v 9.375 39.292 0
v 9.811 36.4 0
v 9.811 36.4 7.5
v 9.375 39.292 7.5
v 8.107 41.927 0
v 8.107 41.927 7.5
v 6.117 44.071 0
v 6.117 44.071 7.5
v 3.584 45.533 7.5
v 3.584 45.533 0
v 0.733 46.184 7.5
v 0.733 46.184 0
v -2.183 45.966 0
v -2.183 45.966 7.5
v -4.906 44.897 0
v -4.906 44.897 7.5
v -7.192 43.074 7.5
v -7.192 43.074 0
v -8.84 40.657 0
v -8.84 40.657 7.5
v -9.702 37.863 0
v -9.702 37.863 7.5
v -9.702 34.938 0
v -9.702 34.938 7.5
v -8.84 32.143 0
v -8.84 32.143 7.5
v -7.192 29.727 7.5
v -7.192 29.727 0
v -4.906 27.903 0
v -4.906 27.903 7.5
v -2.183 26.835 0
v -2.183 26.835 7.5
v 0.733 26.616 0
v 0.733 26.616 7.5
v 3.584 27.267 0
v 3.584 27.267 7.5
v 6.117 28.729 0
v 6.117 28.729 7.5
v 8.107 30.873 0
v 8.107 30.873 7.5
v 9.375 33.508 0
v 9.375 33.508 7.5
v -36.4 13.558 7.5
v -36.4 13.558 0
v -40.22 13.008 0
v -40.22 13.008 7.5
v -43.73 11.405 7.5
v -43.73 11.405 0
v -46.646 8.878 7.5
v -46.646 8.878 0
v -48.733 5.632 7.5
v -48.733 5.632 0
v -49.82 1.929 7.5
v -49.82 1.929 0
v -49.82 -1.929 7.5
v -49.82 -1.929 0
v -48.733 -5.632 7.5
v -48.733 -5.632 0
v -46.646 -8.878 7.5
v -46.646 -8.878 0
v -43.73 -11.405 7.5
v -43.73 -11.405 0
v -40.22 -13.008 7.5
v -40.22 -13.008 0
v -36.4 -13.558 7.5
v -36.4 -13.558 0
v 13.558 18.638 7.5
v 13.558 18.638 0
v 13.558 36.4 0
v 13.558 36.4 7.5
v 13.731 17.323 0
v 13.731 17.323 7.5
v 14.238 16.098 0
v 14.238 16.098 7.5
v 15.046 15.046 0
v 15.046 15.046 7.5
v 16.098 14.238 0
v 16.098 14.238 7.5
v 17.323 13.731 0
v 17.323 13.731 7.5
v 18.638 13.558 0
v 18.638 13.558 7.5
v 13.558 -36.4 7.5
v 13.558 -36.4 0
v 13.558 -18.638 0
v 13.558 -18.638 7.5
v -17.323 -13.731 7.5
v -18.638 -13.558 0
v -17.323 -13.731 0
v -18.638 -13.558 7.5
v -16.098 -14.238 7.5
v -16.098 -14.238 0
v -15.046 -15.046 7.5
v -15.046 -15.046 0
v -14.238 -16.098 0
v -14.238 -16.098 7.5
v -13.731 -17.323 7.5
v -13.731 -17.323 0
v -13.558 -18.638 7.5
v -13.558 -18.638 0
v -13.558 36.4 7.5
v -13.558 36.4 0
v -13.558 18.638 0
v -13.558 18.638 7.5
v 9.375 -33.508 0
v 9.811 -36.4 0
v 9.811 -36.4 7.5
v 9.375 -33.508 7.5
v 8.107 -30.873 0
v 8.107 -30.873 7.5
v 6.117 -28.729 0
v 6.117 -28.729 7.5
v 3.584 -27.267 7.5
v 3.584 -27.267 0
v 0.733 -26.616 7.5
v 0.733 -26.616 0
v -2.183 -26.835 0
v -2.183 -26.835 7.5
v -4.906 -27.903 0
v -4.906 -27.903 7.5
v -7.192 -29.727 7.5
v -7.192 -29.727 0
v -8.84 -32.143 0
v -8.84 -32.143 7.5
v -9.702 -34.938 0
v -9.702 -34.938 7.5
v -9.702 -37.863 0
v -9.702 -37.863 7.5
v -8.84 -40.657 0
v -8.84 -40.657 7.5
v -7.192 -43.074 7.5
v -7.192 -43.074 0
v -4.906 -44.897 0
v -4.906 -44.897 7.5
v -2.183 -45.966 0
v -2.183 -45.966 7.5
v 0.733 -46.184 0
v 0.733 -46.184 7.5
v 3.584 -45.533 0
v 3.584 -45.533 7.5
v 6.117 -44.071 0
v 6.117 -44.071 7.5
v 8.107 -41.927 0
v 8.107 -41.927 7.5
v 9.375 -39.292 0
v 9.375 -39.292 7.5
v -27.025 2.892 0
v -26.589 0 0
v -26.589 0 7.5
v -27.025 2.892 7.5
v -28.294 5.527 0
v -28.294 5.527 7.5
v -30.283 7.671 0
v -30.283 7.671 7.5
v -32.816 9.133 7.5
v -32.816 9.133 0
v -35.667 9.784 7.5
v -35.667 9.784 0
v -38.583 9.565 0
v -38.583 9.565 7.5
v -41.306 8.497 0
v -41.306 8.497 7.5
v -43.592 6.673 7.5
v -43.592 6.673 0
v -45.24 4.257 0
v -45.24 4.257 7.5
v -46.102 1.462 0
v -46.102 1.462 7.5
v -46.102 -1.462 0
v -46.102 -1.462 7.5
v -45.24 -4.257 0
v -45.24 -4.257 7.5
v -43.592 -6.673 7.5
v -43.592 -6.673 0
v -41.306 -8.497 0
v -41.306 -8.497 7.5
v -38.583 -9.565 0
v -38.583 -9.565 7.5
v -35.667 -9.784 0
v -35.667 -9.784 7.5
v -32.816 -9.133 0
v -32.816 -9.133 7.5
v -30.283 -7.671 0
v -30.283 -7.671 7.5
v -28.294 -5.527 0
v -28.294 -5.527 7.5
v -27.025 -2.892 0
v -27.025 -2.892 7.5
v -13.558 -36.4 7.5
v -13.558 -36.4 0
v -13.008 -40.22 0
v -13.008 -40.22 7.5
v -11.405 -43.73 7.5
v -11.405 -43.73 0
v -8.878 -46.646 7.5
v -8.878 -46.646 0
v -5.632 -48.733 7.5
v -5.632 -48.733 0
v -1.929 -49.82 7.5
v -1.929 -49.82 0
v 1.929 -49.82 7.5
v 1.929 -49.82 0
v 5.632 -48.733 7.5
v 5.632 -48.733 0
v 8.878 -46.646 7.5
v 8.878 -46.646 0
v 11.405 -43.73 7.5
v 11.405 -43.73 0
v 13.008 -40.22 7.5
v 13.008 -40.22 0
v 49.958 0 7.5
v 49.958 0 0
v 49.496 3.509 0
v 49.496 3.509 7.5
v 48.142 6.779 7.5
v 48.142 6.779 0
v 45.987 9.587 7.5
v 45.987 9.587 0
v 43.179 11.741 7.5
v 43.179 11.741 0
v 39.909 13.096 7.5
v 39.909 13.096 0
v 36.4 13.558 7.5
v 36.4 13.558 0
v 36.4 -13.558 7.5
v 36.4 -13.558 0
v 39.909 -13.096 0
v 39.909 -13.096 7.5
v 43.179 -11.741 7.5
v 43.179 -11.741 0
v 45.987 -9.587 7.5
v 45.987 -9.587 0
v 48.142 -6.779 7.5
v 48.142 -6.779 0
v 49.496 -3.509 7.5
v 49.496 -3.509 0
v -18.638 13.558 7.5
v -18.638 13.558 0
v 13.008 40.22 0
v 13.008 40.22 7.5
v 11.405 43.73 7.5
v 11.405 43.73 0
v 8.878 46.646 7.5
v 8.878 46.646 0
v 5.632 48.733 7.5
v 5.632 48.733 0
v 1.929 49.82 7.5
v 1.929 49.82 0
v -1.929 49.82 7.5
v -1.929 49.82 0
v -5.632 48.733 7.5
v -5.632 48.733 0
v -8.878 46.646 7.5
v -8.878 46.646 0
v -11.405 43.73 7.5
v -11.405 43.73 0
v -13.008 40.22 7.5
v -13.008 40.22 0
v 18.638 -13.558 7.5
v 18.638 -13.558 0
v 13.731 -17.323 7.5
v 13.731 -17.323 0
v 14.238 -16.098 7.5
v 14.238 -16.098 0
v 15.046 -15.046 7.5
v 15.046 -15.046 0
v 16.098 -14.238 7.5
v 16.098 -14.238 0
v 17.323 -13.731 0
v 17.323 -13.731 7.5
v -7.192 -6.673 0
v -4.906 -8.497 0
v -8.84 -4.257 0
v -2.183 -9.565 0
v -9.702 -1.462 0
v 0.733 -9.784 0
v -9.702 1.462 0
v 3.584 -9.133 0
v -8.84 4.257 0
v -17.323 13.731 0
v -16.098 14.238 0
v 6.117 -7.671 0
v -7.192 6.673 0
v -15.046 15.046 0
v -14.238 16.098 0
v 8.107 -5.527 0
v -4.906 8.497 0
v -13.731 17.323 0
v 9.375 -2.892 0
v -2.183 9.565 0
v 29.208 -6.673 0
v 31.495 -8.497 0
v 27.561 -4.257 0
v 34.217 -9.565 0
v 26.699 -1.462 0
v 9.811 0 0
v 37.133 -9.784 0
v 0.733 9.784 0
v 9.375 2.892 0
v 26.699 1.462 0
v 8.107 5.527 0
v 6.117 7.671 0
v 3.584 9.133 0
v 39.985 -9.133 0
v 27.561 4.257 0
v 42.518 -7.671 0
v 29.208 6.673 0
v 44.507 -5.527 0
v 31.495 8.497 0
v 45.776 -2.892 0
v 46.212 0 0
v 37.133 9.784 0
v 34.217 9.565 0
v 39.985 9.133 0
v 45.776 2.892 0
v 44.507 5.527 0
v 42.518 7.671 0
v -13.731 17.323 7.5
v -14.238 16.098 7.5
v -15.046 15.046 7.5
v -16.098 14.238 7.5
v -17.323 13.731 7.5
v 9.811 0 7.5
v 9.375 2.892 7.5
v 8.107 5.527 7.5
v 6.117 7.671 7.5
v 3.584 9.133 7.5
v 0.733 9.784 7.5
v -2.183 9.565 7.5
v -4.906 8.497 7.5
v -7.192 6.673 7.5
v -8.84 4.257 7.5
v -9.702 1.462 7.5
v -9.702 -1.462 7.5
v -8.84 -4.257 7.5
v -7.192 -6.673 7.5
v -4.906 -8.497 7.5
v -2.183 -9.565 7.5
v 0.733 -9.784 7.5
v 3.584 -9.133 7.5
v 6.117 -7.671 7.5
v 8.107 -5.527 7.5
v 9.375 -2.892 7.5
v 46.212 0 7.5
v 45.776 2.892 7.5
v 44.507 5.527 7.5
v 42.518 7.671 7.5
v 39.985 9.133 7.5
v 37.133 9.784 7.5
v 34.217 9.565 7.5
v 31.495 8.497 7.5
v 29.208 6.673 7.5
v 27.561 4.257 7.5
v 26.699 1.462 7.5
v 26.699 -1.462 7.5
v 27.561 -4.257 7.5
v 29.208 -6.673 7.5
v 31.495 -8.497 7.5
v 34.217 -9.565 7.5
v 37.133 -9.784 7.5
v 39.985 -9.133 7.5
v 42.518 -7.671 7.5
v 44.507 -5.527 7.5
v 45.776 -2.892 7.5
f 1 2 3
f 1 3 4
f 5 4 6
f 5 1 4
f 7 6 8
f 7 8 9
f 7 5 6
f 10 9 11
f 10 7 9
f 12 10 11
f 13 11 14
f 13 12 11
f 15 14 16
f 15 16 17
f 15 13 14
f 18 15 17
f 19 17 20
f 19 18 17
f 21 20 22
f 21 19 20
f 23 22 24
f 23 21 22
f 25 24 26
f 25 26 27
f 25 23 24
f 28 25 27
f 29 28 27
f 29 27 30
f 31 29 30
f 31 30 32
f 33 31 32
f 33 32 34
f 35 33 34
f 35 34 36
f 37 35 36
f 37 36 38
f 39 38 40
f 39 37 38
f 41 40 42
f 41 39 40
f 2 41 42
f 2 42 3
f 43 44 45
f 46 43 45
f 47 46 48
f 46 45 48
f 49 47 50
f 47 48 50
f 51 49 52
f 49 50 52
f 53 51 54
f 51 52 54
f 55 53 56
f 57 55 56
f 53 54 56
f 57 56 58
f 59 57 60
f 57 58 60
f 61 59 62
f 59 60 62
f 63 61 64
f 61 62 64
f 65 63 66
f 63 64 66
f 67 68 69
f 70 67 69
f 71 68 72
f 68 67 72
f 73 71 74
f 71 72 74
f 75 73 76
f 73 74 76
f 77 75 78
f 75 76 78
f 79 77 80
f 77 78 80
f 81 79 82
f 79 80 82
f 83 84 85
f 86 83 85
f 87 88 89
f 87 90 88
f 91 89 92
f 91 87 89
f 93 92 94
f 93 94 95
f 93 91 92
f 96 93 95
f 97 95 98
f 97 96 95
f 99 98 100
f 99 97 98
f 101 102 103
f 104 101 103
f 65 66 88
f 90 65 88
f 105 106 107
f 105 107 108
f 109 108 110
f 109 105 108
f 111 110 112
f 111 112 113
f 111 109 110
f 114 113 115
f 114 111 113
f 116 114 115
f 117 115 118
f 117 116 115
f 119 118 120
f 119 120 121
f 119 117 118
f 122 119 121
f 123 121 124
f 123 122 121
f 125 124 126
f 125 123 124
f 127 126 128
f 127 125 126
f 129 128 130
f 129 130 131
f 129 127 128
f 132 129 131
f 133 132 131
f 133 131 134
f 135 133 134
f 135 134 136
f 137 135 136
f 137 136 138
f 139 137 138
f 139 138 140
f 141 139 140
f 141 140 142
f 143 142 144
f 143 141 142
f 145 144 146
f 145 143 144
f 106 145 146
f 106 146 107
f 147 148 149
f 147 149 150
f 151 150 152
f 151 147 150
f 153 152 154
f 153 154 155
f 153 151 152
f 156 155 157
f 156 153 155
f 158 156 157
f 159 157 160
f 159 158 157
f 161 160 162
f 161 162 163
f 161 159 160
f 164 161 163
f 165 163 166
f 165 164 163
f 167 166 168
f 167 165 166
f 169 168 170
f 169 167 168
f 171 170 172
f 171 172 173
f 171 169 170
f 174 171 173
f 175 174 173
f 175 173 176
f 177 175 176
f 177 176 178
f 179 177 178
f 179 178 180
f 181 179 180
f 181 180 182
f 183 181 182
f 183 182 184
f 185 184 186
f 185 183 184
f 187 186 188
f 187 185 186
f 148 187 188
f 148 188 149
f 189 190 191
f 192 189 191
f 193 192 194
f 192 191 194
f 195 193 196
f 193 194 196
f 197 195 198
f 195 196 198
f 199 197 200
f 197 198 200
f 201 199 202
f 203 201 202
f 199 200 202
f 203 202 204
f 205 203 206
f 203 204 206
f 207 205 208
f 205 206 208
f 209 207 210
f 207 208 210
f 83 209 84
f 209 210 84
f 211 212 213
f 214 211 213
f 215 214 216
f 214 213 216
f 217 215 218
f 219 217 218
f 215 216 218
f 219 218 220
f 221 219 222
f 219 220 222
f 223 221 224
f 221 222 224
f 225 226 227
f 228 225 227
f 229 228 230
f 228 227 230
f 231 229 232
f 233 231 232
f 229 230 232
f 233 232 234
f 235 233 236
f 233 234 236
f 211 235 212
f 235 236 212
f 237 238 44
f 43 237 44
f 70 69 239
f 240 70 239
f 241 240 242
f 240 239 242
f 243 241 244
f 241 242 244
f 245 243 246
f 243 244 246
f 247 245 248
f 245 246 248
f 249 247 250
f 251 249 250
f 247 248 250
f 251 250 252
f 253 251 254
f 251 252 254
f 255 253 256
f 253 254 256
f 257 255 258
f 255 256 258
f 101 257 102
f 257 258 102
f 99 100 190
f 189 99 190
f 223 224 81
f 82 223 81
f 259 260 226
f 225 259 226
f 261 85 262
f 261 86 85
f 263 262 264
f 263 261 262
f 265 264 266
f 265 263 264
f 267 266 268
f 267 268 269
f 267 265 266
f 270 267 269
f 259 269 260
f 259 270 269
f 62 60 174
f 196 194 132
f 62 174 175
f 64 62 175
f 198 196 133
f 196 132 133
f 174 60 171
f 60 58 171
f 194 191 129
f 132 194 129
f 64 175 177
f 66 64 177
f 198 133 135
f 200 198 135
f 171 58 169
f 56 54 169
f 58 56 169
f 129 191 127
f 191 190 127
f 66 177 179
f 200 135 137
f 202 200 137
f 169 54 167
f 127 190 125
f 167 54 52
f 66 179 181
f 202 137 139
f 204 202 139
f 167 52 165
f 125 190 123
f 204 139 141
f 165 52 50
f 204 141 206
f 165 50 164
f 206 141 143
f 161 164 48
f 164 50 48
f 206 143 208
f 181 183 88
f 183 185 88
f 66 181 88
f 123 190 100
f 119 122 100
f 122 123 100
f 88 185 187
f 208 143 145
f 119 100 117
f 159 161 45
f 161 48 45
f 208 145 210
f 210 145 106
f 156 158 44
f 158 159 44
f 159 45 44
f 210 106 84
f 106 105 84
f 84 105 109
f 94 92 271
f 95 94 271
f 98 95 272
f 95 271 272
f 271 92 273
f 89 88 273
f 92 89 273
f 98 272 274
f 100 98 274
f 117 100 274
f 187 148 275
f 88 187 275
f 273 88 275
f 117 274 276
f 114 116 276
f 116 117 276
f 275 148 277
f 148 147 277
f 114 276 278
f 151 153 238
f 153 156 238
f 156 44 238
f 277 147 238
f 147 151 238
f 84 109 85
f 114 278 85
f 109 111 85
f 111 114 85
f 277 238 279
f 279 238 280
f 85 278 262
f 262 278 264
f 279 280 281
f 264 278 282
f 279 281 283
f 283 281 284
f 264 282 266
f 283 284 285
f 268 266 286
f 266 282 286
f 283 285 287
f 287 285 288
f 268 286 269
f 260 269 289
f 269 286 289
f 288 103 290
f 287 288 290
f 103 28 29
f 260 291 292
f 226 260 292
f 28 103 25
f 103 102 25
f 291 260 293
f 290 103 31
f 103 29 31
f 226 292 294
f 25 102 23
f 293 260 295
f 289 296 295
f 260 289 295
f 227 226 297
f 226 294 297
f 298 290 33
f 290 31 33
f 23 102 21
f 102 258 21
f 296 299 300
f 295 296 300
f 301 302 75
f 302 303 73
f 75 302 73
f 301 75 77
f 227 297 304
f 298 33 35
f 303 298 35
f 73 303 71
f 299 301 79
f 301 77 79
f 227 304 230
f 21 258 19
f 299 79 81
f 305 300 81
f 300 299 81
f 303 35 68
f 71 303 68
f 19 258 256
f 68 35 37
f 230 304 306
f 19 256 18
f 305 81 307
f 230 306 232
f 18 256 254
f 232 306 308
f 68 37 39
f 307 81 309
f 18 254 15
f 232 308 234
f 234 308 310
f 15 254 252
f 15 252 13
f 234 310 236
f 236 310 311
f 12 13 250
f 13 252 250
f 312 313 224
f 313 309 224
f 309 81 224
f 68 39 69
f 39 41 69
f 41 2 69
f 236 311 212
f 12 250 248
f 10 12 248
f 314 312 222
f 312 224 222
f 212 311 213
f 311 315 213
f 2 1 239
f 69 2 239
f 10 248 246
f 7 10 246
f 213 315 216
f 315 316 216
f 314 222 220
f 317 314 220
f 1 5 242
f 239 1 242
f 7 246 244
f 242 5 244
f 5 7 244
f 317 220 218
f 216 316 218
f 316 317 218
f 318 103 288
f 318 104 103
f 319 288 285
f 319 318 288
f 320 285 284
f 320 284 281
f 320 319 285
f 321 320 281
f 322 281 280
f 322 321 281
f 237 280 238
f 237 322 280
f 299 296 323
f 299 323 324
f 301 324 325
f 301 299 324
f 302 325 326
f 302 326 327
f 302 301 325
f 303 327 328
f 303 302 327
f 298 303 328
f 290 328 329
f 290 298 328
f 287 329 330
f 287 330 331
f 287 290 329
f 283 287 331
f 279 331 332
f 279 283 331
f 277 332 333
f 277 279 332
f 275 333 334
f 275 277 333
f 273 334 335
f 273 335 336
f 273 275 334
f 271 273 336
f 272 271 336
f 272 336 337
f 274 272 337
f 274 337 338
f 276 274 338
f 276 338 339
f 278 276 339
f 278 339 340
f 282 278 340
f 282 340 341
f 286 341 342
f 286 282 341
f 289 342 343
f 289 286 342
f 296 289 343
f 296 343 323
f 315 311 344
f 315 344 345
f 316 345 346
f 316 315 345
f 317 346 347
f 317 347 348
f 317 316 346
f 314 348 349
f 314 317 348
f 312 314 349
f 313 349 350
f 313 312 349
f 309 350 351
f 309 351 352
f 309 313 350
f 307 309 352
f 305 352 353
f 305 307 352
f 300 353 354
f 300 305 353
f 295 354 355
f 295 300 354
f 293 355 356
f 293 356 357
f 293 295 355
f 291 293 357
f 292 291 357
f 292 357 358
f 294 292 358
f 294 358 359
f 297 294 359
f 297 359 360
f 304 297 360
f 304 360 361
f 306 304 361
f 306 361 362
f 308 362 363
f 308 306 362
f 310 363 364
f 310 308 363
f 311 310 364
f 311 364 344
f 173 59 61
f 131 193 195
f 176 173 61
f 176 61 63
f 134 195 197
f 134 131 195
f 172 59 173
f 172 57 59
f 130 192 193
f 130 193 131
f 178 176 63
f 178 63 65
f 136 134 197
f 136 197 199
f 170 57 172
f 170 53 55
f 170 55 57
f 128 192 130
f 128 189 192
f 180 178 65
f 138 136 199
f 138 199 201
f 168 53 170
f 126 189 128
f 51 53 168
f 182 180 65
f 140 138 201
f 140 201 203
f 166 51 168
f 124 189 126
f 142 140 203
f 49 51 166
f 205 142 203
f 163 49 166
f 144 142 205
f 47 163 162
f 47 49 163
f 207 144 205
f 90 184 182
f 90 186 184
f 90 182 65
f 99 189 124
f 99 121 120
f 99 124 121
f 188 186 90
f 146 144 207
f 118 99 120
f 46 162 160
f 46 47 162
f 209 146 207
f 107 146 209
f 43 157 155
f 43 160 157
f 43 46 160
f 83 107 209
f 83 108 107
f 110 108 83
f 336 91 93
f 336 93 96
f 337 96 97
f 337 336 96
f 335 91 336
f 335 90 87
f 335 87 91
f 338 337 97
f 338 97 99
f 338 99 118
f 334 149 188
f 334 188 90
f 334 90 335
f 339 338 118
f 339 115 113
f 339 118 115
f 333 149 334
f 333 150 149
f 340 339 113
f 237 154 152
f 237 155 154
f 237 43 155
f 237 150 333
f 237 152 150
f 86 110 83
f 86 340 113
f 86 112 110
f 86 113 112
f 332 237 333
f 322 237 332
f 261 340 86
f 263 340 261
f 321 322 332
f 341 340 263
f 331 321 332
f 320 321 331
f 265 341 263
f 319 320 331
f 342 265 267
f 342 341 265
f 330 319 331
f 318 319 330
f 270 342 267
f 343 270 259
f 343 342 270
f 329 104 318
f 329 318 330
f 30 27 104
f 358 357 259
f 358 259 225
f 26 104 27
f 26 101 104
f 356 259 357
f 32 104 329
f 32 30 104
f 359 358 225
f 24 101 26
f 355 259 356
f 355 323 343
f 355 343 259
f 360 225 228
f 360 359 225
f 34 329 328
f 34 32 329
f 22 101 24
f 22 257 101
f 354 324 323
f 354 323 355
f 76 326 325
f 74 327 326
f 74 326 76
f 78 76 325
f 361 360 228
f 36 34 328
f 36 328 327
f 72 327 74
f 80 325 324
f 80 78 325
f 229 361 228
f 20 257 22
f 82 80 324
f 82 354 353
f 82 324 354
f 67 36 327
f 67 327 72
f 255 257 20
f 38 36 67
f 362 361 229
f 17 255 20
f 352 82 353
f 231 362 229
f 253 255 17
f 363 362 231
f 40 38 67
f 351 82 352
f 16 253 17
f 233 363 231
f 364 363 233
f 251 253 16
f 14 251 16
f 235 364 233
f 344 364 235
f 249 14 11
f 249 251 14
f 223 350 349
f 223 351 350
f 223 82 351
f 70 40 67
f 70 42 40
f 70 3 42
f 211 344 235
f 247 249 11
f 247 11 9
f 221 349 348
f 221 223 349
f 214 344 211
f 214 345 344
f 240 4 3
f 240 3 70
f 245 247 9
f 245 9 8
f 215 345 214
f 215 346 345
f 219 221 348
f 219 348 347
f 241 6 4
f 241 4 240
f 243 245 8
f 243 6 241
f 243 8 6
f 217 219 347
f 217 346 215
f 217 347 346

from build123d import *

# Parameters (mm, degrees)
F0_R     = 9.811337
F1_DEPTH = 7.5
F2_R     = 5.08
F3_R     = 5.08
F4_R     = 5.08
F5_R     = 5.08


with BuildPart() as f1:
    # F0 (on Top) → F1 (new body)
    with BuildSketch(Plane.XY):
        with BuildLine():
            ThreePointArc((-13.557643, 36.400266), (0, 22.842624), (13.557643, 36.400266))
            ThreePointArc((13.557643, 36.400266), (0, 49.957909), (-13.557643, 36.400266))
        make_face()
        with Locations((0, 36.400266)):
            Circle(F0_R, mode=Mode.SUBTRACT)
        with BuildLine():
            Line((13.557643, 13.557643), (13.557643, 36.400266))
            ThreePointArc((13.557643, 36.400266), (0, 22.842624), (-13.557643, 36.400266))
            Line((-13.557643, 36.400266), (-13.557643, 13.557643))
            Line((-13.557643, 13.557643), (-36.400266, 13.557643))
            ThreePointArc((-36.400266, 13.557643), (-26.813565, 9.586701), (-22.842624, 0))
            ThreePointArc((-22.842624, 0), (-26.813565, -9.586701), (-36.400266, -13.557643))
            Line((-36.400266, -13.557643), (-13.557643, -13.557643))
            Line((-13.557643, -13.557643), (-13.557643, -36.400266))
            ThreePointArc((-13.557643, -36.400266), (0, -22.842624), (13.557643, -36.400266))
            Line((13.557643, -36.400266), (13.557643, -13.557643))
            Line((13.557643, -13.557643), (36.400266, -13.557643))
            ThreePointArc((36.400266, -13.557643), (22.842624, 0), (36.400266, 13.557643))
            Line((36.400266, 13.557643), (13.557643, 13.557643))
        make_face()
        Circle(F0_R, mode=Mode.SUBTRACT)
        with BuildLine():
            ThreePointArc((49.957909, 0), (45.986968, 9.586701), (36.400266, 13.557643))
            ThreePointArc((36.400266, 13.557643), (22.842624, 0), (36.400266, -13.557643))
            ThreePointArc((36.400266, -13.557643), (45.986968, -9.586701), (49.957909, 0))
        make_face()
        with Locations((36.400266, 0)):
            Circle(F0_R, mode=Mode.SUBTRACT)
        with BuildLine():
            ThreePointArc((-22.842624, 0), (-26.813565, 9.586701), (-36.400266, 13.557643))
            ThreePointArc((-36.400266, 13.557643), (-49.957909, 0), (-36.400266, -13.557643))
            ThreePointArc((-36.400266, -13.557643), (-26.813565, -9.586701), (-22.842624, 0))
        make_face()
        with Locations((-36.400266, 0)):
            Circle(F0_R, mode=Mode.SUBTRACT)
        with BuildLine():
            ThreePointArc((-13.557643, -36.400266), (0, -49.957909), (13.557643, -36.400266))
            ThreePointArc((13.557643, -36.400266), (0, -22.842624), (-13.557643, -36.400266))
        make_face()
        with Locations((0, -36.400266)):
            Circle(F0_R, mode=Mode.SUBTRACT)
    extrude(amount=F1_DEPTH)

    # F2
    f2_edges = [f1.edges().sort_by_distance(p)[0] for p in [
        (-13.557643, 13.557643, 3.75),
    ]]
    fillet(f2_edges, radius=F2_R)

    # F3
    f3_edges = [f1.edges().sort_by_distance(p)[0] for p in [
        (13.557643, 13.557643, 3.75),
    ]]
    fillet(f3_edges, radius=F3_R)

    # F4
    f4_edges = [f1.edges().sort_by_distance(p)[0] for p in [
        (-13.557643, -13.557643, 3.75),
    ]]
    fillet(f4_edges, radius=F4_R)

    # F5
    f5_edges = [f1.edges().sort_by_distance(p)[0] for p in [
        (13.557643, -13.557643, 3.75),
    ]]
    fillet(f5_edges, radius=F5_R)


solid = f1.part
